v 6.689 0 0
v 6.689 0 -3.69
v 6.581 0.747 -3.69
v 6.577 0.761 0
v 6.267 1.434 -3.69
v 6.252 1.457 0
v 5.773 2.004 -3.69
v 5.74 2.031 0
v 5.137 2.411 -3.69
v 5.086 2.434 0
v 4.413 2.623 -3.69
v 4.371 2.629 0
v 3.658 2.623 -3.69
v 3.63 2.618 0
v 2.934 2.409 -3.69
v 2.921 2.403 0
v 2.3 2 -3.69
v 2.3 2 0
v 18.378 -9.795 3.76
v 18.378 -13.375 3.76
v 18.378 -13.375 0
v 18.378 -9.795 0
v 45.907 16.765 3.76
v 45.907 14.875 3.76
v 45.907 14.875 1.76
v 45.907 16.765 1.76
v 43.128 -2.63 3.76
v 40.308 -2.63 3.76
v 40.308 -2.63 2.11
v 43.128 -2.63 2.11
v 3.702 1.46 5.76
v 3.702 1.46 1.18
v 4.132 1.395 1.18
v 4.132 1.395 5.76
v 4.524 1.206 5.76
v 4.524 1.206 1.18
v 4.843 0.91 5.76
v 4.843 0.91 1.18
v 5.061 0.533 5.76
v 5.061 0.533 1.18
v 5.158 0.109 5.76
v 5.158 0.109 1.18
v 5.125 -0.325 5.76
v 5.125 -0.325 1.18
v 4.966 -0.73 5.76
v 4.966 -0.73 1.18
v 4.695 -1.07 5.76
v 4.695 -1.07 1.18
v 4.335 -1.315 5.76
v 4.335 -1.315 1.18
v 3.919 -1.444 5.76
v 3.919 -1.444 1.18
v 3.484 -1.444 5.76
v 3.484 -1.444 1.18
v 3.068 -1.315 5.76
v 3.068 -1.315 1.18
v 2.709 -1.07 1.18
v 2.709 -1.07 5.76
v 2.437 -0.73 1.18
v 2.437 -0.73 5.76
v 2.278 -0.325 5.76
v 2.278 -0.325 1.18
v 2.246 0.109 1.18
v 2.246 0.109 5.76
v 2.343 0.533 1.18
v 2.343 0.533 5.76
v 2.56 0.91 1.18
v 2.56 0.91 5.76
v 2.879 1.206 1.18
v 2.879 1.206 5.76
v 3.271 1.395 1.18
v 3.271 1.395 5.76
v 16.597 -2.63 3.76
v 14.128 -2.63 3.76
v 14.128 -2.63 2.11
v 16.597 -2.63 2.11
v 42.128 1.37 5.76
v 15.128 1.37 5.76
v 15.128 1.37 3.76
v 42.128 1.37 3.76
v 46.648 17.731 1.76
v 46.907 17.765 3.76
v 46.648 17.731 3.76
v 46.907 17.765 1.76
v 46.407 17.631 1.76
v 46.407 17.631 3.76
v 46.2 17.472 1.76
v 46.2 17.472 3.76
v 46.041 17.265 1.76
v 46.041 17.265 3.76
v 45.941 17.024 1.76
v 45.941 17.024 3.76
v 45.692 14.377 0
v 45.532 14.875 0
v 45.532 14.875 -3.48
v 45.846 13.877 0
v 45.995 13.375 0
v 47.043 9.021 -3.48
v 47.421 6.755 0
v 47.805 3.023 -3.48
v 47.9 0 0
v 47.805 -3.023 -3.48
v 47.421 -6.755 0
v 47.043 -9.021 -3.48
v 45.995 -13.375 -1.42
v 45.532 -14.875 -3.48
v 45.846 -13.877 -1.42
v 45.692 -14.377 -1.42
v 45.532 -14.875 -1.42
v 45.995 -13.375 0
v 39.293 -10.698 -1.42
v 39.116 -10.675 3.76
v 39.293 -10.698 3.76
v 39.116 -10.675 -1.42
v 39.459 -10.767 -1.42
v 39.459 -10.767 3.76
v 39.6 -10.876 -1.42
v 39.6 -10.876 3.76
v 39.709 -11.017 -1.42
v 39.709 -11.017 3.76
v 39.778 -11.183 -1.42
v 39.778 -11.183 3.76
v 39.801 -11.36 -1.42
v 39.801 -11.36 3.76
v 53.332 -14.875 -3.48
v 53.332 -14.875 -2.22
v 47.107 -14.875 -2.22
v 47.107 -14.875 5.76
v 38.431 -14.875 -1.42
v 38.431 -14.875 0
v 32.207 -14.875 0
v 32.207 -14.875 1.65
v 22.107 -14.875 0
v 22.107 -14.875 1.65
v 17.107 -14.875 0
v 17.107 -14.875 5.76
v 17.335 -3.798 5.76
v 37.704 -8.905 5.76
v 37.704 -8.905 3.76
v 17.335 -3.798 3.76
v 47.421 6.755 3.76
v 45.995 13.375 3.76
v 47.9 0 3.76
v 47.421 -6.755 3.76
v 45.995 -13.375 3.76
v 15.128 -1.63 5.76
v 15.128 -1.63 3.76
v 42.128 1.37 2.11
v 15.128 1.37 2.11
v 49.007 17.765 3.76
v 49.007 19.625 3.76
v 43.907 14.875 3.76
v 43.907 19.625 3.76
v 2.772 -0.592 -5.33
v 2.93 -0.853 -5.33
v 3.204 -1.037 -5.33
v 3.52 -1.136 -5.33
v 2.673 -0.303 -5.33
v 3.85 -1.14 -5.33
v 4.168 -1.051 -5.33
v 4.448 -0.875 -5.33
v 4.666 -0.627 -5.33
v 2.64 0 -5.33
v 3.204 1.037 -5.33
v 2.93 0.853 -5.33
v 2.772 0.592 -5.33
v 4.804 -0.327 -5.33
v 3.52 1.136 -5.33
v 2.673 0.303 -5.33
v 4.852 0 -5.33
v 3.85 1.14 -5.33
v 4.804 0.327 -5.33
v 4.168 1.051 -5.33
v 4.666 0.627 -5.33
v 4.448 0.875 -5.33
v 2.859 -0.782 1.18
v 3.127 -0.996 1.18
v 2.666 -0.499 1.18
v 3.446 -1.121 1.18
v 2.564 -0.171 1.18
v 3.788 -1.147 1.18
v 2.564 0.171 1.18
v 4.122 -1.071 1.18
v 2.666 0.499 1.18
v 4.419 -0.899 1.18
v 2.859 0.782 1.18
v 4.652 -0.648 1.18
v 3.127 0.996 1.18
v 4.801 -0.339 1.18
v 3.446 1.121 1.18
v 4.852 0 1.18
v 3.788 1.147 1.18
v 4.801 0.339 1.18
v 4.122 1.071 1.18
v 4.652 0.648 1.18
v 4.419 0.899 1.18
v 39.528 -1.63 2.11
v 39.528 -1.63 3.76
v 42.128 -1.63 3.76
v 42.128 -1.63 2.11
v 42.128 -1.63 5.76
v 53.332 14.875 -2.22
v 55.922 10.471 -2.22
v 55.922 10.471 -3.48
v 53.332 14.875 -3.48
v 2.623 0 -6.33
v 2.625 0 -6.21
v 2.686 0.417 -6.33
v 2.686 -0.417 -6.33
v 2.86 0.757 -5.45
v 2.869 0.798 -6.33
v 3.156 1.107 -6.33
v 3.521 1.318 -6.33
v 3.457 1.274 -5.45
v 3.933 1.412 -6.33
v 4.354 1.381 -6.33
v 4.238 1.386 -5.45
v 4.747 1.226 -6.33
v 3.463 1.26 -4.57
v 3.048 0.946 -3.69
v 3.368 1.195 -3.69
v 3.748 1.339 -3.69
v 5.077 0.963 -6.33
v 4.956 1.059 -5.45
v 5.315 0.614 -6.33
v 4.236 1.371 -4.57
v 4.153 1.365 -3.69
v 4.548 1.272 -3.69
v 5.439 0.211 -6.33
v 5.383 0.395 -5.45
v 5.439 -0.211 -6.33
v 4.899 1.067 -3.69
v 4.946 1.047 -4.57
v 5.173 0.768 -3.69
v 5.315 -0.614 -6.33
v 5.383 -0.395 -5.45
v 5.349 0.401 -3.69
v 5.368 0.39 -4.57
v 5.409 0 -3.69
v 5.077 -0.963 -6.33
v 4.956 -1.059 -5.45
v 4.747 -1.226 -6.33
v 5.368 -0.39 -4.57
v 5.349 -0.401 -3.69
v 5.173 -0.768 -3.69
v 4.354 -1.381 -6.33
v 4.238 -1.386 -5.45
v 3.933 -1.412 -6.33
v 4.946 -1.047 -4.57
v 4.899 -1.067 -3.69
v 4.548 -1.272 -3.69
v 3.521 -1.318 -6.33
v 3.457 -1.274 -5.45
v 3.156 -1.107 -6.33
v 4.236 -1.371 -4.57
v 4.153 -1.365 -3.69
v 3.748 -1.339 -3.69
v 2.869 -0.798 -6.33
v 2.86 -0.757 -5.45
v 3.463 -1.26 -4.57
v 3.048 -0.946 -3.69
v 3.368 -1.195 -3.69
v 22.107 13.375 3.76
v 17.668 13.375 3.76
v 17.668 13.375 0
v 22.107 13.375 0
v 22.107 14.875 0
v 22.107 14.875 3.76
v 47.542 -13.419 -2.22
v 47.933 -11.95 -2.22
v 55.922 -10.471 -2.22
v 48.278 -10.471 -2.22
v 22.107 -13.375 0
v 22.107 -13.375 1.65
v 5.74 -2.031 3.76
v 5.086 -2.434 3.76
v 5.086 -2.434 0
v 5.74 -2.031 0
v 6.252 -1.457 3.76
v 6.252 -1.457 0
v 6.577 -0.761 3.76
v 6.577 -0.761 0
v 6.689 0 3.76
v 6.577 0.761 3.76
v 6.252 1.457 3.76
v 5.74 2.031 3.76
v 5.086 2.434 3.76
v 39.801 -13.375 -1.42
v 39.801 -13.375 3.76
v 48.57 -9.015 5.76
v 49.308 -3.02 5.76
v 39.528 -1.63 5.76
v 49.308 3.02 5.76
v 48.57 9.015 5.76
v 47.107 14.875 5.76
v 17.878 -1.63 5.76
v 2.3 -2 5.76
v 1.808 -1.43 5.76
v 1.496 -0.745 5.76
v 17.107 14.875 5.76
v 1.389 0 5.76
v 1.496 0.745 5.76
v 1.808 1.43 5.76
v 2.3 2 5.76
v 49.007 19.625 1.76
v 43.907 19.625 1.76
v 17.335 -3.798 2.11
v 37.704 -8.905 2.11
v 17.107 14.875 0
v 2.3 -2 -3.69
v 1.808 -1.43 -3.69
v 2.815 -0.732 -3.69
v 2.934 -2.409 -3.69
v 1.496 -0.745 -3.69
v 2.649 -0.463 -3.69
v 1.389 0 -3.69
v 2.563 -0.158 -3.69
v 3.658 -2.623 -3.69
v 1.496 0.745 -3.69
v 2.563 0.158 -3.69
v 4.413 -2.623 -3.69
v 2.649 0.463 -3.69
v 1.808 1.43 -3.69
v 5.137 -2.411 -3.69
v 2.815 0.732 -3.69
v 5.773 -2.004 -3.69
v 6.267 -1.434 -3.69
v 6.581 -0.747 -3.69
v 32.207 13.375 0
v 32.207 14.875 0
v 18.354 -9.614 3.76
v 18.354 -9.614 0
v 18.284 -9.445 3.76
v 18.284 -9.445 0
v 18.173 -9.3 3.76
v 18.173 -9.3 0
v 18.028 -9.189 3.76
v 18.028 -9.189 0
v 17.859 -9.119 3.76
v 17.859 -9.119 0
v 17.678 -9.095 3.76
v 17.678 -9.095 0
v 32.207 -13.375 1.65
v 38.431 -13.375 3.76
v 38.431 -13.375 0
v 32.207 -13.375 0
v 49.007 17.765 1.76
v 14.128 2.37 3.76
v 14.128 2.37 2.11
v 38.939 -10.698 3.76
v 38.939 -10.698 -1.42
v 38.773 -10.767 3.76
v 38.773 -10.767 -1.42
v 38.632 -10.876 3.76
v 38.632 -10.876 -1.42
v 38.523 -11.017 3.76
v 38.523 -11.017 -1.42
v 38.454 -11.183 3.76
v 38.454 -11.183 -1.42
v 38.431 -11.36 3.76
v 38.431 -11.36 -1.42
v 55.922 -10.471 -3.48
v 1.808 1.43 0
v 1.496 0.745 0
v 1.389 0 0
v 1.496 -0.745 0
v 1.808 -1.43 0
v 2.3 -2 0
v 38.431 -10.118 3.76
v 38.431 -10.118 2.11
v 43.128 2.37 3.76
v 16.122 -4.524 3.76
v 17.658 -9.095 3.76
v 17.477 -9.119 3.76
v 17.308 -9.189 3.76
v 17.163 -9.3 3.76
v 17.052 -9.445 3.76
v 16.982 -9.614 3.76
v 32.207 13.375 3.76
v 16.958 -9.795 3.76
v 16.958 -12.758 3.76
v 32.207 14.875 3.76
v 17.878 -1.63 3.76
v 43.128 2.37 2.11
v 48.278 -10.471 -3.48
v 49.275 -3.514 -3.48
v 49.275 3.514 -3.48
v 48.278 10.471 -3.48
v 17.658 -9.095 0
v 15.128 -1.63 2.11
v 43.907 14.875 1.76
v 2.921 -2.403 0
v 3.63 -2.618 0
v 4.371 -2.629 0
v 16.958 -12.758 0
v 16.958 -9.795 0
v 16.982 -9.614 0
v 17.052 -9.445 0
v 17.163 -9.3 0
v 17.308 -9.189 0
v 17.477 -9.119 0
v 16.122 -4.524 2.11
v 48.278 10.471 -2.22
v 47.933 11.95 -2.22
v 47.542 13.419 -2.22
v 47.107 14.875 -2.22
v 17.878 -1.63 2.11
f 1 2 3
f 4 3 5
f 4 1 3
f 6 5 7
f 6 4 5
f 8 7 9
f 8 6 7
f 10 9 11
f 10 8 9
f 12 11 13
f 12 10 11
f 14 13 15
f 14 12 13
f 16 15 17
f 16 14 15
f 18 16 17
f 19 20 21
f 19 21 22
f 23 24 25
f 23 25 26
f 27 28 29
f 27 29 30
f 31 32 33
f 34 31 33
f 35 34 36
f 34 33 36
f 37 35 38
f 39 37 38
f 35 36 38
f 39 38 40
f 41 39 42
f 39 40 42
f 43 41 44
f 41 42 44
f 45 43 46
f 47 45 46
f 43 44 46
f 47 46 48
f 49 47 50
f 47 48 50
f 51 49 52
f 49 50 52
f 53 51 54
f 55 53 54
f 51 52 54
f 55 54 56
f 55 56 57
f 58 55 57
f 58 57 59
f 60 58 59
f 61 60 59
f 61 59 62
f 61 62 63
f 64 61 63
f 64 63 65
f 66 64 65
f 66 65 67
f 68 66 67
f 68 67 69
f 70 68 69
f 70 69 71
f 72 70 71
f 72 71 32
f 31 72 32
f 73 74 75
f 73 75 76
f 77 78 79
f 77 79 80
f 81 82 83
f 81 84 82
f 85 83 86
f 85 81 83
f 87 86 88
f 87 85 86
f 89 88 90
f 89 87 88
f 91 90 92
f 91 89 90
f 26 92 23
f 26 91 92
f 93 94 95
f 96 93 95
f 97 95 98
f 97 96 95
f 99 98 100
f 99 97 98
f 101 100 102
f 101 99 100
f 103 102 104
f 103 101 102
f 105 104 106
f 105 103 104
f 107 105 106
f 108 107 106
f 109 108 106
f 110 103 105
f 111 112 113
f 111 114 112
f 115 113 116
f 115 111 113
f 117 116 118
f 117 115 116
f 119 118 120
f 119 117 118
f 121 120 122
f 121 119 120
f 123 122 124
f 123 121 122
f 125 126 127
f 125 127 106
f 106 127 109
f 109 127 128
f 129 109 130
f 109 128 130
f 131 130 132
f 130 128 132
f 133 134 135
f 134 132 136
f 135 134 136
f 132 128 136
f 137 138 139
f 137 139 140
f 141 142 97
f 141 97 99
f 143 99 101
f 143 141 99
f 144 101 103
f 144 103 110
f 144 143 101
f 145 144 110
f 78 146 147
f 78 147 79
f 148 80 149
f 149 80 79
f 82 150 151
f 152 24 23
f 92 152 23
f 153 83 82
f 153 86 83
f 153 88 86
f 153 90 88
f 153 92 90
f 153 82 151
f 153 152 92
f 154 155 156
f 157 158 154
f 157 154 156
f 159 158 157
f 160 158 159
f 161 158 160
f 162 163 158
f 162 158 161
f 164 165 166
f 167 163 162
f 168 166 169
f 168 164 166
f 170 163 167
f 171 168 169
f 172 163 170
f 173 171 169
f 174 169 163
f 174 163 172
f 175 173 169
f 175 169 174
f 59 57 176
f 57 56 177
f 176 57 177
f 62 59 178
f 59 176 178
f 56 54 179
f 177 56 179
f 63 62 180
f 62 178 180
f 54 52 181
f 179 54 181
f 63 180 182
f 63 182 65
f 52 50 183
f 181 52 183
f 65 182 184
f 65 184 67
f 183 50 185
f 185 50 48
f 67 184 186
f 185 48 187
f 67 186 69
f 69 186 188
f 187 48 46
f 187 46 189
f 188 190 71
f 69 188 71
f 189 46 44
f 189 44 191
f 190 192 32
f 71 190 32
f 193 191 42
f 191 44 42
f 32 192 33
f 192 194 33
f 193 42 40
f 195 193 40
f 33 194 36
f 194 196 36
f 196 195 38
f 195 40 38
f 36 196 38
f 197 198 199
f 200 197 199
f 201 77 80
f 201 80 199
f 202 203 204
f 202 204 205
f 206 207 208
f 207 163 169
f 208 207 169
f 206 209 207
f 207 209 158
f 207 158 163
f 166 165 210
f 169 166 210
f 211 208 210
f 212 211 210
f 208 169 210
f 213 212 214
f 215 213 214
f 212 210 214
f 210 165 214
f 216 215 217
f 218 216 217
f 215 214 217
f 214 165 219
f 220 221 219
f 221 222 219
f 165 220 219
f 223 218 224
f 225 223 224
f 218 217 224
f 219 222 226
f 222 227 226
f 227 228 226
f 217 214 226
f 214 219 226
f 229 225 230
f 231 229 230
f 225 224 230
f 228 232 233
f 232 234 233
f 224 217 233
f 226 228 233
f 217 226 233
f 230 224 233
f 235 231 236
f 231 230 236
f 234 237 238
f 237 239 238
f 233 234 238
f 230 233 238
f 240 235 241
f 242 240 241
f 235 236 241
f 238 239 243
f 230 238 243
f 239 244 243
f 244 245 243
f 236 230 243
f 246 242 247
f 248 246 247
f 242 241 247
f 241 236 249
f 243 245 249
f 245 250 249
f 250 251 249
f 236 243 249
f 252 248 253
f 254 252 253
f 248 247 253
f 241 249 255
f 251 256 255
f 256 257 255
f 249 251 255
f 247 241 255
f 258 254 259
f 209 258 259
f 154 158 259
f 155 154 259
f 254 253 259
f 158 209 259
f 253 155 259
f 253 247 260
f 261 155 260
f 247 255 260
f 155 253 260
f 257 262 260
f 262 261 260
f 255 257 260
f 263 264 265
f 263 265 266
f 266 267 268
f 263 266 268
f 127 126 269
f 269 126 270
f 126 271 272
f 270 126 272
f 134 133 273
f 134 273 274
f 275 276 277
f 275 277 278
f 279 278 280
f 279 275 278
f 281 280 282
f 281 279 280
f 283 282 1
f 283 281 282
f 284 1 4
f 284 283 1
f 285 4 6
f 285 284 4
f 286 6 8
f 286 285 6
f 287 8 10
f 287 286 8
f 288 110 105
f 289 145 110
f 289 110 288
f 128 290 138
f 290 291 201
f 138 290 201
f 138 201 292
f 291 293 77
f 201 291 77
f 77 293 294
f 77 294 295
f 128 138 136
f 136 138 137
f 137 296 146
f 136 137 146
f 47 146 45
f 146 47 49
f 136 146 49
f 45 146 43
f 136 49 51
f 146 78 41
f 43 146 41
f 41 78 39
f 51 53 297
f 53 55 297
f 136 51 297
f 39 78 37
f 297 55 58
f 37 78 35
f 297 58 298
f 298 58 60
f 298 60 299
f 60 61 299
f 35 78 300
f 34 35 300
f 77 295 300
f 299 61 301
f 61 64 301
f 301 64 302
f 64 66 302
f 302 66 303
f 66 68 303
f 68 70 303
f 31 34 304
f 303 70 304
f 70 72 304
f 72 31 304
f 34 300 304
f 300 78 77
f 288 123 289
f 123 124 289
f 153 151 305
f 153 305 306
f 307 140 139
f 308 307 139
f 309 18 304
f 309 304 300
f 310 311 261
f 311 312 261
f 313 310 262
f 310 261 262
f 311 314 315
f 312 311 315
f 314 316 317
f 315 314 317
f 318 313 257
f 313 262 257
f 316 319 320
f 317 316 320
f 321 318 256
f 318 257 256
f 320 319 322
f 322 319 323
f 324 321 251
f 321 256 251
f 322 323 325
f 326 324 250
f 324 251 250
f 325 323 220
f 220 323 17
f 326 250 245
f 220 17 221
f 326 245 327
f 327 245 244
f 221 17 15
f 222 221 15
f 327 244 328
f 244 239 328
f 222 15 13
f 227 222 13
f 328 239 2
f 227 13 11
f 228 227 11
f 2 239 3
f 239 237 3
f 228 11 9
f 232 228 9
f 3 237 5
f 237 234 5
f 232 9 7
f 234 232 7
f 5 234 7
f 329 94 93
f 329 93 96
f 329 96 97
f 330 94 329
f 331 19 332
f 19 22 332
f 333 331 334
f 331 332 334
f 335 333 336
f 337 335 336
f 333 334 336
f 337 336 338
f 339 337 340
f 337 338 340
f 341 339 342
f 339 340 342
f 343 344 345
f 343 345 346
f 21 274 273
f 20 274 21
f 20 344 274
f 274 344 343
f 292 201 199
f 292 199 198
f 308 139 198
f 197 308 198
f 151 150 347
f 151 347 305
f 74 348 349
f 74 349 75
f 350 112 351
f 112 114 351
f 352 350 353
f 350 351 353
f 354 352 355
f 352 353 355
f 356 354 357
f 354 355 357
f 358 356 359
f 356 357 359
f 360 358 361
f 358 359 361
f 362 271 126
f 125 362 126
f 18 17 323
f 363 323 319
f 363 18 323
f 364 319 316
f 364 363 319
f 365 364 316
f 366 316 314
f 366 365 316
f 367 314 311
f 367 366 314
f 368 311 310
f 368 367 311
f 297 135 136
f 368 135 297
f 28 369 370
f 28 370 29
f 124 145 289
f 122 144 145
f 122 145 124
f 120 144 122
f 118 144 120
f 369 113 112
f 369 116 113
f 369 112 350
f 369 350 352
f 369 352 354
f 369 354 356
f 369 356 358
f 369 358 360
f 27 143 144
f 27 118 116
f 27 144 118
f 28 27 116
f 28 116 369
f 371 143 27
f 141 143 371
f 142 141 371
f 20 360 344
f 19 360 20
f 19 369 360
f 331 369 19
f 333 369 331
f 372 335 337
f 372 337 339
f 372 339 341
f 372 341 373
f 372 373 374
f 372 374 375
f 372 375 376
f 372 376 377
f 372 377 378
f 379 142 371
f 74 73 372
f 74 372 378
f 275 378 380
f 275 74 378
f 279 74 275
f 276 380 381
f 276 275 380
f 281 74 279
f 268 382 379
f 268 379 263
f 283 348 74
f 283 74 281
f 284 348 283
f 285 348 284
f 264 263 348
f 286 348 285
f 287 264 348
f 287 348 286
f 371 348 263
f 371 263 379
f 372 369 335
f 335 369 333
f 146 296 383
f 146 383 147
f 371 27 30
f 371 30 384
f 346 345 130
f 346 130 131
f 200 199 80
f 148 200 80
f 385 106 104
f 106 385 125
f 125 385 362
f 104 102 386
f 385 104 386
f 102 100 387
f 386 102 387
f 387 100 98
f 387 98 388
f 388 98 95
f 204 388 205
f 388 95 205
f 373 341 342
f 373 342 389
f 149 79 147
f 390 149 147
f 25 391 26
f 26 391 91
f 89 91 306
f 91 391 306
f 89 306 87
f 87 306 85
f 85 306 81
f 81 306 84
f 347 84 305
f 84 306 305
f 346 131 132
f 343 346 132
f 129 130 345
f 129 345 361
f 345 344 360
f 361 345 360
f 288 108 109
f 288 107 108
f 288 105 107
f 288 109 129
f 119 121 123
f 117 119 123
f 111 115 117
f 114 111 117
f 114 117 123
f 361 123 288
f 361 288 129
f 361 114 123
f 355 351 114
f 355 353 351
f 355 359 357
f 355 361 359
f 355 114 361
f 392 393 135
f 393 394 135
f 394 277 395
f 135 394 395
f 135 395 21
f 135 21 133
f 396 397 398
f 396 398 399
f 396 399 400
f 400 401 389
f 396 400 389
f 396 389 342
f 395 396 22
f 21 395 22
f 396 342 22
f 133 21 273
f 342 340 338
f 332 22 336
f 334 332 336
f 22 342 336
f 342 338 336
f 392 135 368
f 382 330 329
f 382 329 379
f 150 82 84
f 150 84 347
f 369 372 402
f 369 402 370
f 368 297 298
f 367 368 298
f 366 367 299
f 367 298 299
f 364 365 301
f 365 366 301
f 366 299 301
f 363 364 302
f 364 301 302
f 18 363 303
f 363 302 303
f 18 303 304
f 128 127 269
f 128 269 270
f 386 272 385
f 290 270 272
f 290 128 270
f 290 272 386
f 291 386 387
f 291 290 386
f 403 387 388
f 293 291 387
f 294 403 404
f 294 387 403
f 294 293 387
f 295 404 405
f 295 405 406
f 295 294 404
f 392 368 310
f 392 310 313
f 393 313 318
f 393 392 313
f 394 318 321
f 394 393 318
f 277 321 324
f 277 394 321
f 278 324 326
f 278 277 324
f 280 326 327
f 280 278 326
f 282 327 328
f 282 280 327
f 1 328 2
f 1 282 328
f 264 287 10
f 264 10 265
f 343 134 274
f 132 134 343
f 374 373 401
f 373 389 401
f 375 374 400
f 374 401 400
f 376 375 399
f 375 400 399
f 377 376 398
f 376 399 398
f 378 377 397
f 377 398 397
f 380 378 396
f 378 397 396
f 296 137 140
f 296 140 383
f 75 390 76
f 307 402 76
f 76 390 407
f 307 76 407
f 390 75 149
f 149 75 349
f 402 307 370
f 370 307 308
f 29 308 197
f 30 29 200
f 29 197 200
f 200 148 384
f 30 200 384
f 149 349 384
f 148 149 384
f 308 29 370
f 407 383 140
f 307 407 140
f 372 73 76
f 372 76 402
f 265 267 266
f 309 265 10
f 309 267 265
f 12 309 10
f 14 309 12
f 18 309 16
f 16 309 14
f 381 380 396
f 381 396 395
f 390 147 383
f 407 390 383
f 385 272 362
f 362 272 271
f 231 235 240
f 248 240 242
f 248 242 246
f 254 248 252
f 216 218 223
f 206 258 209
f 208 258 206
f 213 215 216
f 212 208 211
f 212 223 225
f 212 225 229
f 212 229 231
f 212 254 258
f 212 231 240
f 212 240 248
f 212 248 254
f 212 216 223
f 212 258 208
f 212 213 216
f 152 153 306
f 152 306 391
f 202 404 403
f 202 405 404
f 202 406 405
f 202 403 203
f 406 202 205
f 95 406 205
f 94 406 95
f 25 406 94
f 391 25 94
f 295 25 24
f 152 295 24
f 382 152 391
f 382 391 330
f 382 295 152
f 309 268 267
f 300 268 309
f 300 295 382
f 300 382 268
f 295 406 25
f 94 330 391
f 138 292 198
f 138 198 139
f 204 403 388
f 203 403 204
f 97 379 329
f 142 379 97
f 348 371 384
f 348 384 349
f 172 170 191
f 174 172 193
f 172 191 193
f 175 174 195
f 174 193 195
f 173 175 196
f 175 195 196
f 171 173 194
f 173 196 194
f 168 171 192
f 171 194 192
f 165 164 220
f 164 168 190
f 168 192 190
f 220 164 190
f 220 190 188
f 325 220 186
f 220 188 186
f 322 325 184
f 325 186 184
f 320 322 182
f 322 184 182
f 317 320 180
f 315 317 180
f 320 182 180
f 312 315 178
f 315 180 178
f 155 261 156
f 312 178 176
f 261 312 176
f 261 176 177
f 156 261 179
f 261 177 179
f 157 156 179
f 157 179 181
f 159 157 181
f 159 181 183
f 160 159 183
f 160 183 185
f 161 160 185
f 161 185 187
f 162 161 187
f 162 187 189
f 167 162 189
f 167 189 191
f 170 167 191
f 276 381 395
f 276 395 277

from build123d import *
from build123d.topology import SkipClean

# Parameters (mm, degrees)
BASE_EXTRUDE_DEPTH  = 5.76
SKETCH2_R           = 2.65
BOSS_EXTRUDE1_DEPTH = 9.45
CUT_EXTRUDE3_DEPTH  = 53.449290987
SKETCH4_R           = 1.37
BOSS_EXTRUDE2_DEPTH = 2.64
BOSS_EXTRUDE2_DRAFT = -1
SKETCH7_R           = 1.15
CUT_EXTRUDE4_DEPTH  = 11.09
CUT_EXTRUDE5_DEPTH  = 53.988618848
CUT_EXTRUDE6_START  = -3.76
CUT_EXTRUDE6_DEPTH  = 3.76
BOSS_EXTRUDE3_DEPTH = 1.65
SKETCH11_W          = 10.1
SKETCH11_H          = 3.76
CUT_EXTRUDE7_DEPTH  = 1.5
SKETCH12_W          = 10.1
SKETCH12_H          = 1.65
CUT_EXTRUDE8_DEPTH  = 1.5
BOSS_EXTRUDE4_DEPTH = 3.76
FILLET1_R           = 0.7
BOSS_EXTRUDE5_START = -3.76
BOSS_EXTRUDE5_DEPTH = 5.18
FILLET5_R           = 0.685
BOSS_EXTRUDE6_DEPTH = 3.48
BOSS_EXTRUDE7_START = -1.26
BOSS_EXTRUDE7_DEPTH = 1.26
BOSS_EXTRUDE8_DEPTH = 4
SKETCH18_W          = 2
SKETCH18_H          = 4.75
CUT_EXTRUDE9_DEPTH  = 48.255056695
FILLET2_R           = 1
SKETCH21_R          = 1.46
CUT_EXTRUDE13_DEPTH = 6.58


with BuildPart() as part:
    # Sketch1 → Base-Extrude (new body)
    with BuildSketch(Plane.XY):
        with BuildLine():
            Line((0, 0), (17.107264567, 14.875))
            Line((17.107264567, 14.875), (47.107264567, 14.875))
            ThreePointArc((47.107264567, 14.875), (49.4, 0), (47.107264567, -14.875))
            Line((47.107264567, -14.875), (17.107264567, -14.875))
            Line((17.107264567, -14.875), (0, 0))
        make_face()
    extrude(amount=BASE_EXTRUDE_DEPTH)

    # Sketch2 → Boss-Extrude1 (add)
    with BuildSketch(Plane.XY.offset(5.76)):
        with Locations((4.038670317, 0)):
            Circle(SKETCH2_R)
    extrude(amount=-BOSS_EXTRUDE1_DEPTH)

    # Sketch3 → Cut-Extrude3 (cut, through all)
    with SkipClean():  # the faces are left unmerged after this step: merging them gives an invalid solid
        with BuildSketch(Plane.XY.offset(5.76)):
            with BuildLine():
                Line((0, 0), (2.299855448, -1.999755698))
                ThreePointArc((2.299855448, -1.999755698), (1.388670317, 0), (2.299855448, 1.999755698))
                Line((2.299855448, 1.999755698), (0, 0))
            make_face()
        extrude(amount=-CUT_EXTRUDE3_DEPTH, mode=Mode.SUBTRACT)


with BuildPart() as boss_extrude2_tool:
    # Sketch4 → Boss-Extrude2 (with draft: the straight prism first)
    with BuildSketch(Plane(origin=(0, 0, -3.69), x_dir=(-1, 0, 0), z_dir=(0, 0, -1))):
        with Locations((-4.038670317, 0)):
            Circle(SKETCH4_R)
    extrude(amount=BOSS_EXTRUDE2_DEPTH)
    # Boss-Extrude2: the draft: its side faces are tilted about the plane it starts from
    boss_extrude2_sides = [boss_extrude2_tool.faces().sort_by_distance(p)[0] for p in [
        (5.408670317, 0, -5.01),
    ]]
    draft(boss_extrude2_sides, Plane(origin=(0, 0, -3.69), x_dir=(-1, 0, 0), z_dir=(0, 0, -1)), BOSS_EXTRUDE2_DRAFT)


with BuildPart() as part_1:
    add(part.part)

    # Boss-Extrude2: add boss_extrude2_tool
    add(boss_extrude2_tool.part)

    # Sketch7 → Cut-Extrude4 (cut)
    with SkipClean():  # the faces are left unmerged after this step: merging them gives an invalid solid
        with BuildSketch(Plane.XY.offset(5.76)):
            with Locations((3.701631462, 0)):
                Circle(SKETCH7_R)
        extrude(amount=-CUT_EXTRUDE4_DEPTH, mode=Mode.SUBTRACT)

    # Sketch8 → Cut-Extrude5 (cut, through all)
    with SkipClean():  # the faces are left unmerged after this step: merging them gives an invalid solid
        with BuildSketch(Plane.XY.offset(5.76)):
            Polygon((15.128209475, 1.37), (42.128209475, 1.37), (42.128209475, -1.63), (39.528209475, -1.63), (37.70423163, -8.90482679), (17.334716619, -3.797688825), (17.878209475, -1.63), (15.128209475, -1.63), align=None)
        extrude(amount=-CUT_EXTRUDE5_DEPTH, mode=Mode.SUBTRACT)

    # Sketch9 → Cut-Extrude6 (cut)
    with SkipClean():  # the faces are left unmerged after this step: merging them gives an invalid solid
        with BuildSketch(Plane(origin=(0, 0, 0), x_dir=(-1, 0, 0), z_dir=(0, 0, -1)).offset(CUT_EXTRUDE6_START)):
            with BuildLine():
                Line((-5.085732276, 2.434370813), (-17.66820206, 13.375))
                Line((-17.66820206, 13.375), (-45.994775519, 13.375))
                ThreePointArc((-45.994775519, 13.375), (-47.9, 0), (-45.994775519, -13.375))
                Line((-45.994775519, -13.375), (-17.66820206, -13.375))
                Line((-17.66820206, -13.375), (-5.085732276, -2.434370813))
                ThreePointArc((-5.085732276, -2.434370813), (-6.688670317, 0), (-5.085732276, 2.434370813))
            make_face()
        extrude(amount=CUT_EXTRUDE6_DEPTH, mode=Mode.SUBTRACT)

    # Sketch10 → Boss-Extrude3 (add)
    with SkipClean():  # the faces are left unmerged after this step: merging them gives an invalid solid
        with BuildSketch(Plane(origin=(0, 0, 3.76), x_dir=(-1, 0, 0), z_dir=(0, 0, -1))):
            Polygon((-43.128209475, -2.63), (-43.128209475, 2.37), (-14.128209475, 2.37), (-14.128209475, -2.63), (-16.59653252, -2.63), (-16.121542667, -4.524468684), (-38.431011489, -10.118000741), (-40.308437282, -2.63), align=None)
            Polygon((-15.128209475, 1.37), (-15.128209475, -1.63), (-17.878209475, -1.63), (-17.334716619, -3.797688825), (-37.70423163, -8.90482679), (-39.528209475, -1.63), (-42.128209475, -1.63), (-42.128209475, 1.37), align=None, mode=Mode.SUBTRACT)
        extrude(amount=BOSS_EXTRUDE3_DEPTH)

    # Sketch11 → Cut-Extrude7 (cut)
    with SkipClean():  # the faces are left unmerged after this step: merging them gives an invalid solid
        with BuildSketch(Plane(origin=(0, 14.875, 0), x_dir=(-1, 0, 0), z_dir=(0, 1, 0))):
            with Locations((-27.157264567, 1.88)):
                Rectangle(SKETCH11_W, SKETCH11_H)
        extrude(amount=-CUT_EXTRUDE7_DEPTH, mode=Mode.SUBTRACT)

    # Sketch12 → Cut-Extrude8 (cut)
    with BuildSketch(Plane.XZ.offset(14.875)):
        with Locations((27.157264567, 0.825)):
            Rectangle(SKETCH12_W, SKETCH12_H)
    extrude(amount=-CUT_EXTRUDE8_DEPTH, mode=Mode.SUBTRACT)

    # Sketch13 → Boss-Extrude4 (add)
    with BuildSketch(Plane(origin=(0, 0, 3.76), x_dir=(-1, 0, 0), z_dir=(0, 0, -1))):
        Polygon((-18.37820206, -13.375), (-18.37820206, -9.095), (-16.95820206, -9.095), (-16.95820206, -12.757645311), (-17.66820206, -13.375), align=None)
    extrude(amount=BOSS_EXTRUDE4_DEPTH)

    # Fillet1
    fillet1_edges = [part_1.edges().sort_by_distance(p)[0] for p in [
        (16.95820206, -9.095, 1.88),
        (18.37820206, -9.095, 1.88),
    ]]
    fillet(fillet1_edges, radius=FILLET1_R)

    # Sketch14 → Boss-Extrude5 (add)
    with BuildSketch(Plane(origin=(0, 0, 0), x_dir=(-1, 0, 0), z_dir=(0, 0, -1)).offset(BOSS_EXTRUDE5_START)):
        Polygon((-38.431011489, -10.675), (-39.801011489, -10.675), (-39.801011489, -13.375), (-45.994775519, -13.375), (-47.107264567, -14.875), (-38.431011489, -14.875), align=None)
    extrude(amount=BOSS_EXTRUDE5_DEPTH)

    # Fillet5
    fillet5_edges = [part_1.edges().sort_by_distance(p)[0] for p in [
        (38.431011489, -10.675, 1.17),
        (39.801011489, -10.675, 1.17),
    ]]
    fillet(fillet5_edges, radius=FILLET5_R - 0.0001)  # a hair under: the kernel refuses the full size

    # Sketch15 → Boss-Extrude6 (add)
    with BuildSketch(Plane(origin=(0, 0, 0), x_dir=(-1, 0, 0), z_dir=(0, 0, -1))):
        with BuildLine():
            Line((-47.107264567, 14.875), (-45.53179521, 14.875))
            ThreePointArc((-45.53179521, 14.875), (-47.9, 0), (-45.53179521, -14.875))
            Line((-45.53179521, -14.875), (-47.107264567, -14.875))
            ThreePointArc((-47.107264567, -14.875), (-49.4, 0), (-47.107264567, 14.875))
        make_face()
    extrude(amount=BOSS_EXTRUDE6_DEPTH)

    # Sketch16 → Boss-Extrude7 (add)
    with BuildSketch(Plane(origin=(0, 0, -3.48), x_dir=(-1, 0, 0), z_dir=(0, 0, -1)).offset(BOSS_EXTRUDE7_START)):
        with BuildLine():
            Line((-47.107264567, -14.875), (-45.53179521, -14.875))
            ThreePointArc((-45.53179521, -14.875), (-46.189233829, -12.687185592), (-46.741612583, -10.470513507))
            Line((-46.741612583, -10.470513507), (-55.921612583, -10.470513507))
            Line((-55.921612583, -10.470513507), (-53.33179521, -14.875))
            Line((-53.33179521, -14.875), (-47.107264567, -14.875))
        make_face()
        with BuildLine():
            Line((-47.107264567, 14.875), (-45.53179521, 14.875))
            ThreePointArc((-45.53179521, 14.875), (-46.189233829, 12.687185592), (-46.741612583, 10.470513507))
            Line((-46.741612583, 10.470513507), (-55.921612583, 10.470513507))
            Line((-55.921612583, 10.470513507), (-53.33179521, 14.875))
            Line((-53.33179521, 14.875), (-47.107264567, 14.875))
        make_face()
    extrude(amount=BOSS_EXTRUDE7_DEPTH)

    # Sketch17 → Boss-Extrude8 (add)
    with BuildSketch(Plane.XY.offset(5.76)):
        Polygon((45.907264567, 14.875), (45.907264567, 17.765), (49.007264567, 17.765), (49.007264567, 19.625), (43.907264567, 19.625), (43.907264567, 14.875), align=None)
    extrude(amount=-BOSS_EXTRUDE8_DEPTH)

    # Sketch18 → Cut-Extrude9 (cut, through all)
    with BuildSketch(Plane.ZY.offset(-43.907264567)):
        with Locations((4.76, 17.25)):
            Rectangle(SKETCH18_W, SKETCH18_H)
    extrude(amount=-CUT_EXTRUDE9_DEPTH, mode=Mode.SUBTRACT)

    # Fillet2
    fillet2_edges = [part_1.edges().sort_by_distance(p)[0] for p in [
        (45.907264567, 17.765, 2.76),
    ]]
    fillet(fillet2_edges, radius=FILLET2_R)

    # Sketch21 → Cut-Extrude13 (cut)
    with BuildSketch(Plane(origin=(0, 0, 1.18), x_dir=(-1, 0, 0), z_dir=(0, 0, -1))):
        with Locations(Location((-3.701631462, 0, 0), (0, 0, 90))):
            Circle(SKETCH21_R)
    extrude(amount=-CUT_EXTRUDE13_DEPTH, mode=Mode.SUBTRACT)


solid = part_1.part
